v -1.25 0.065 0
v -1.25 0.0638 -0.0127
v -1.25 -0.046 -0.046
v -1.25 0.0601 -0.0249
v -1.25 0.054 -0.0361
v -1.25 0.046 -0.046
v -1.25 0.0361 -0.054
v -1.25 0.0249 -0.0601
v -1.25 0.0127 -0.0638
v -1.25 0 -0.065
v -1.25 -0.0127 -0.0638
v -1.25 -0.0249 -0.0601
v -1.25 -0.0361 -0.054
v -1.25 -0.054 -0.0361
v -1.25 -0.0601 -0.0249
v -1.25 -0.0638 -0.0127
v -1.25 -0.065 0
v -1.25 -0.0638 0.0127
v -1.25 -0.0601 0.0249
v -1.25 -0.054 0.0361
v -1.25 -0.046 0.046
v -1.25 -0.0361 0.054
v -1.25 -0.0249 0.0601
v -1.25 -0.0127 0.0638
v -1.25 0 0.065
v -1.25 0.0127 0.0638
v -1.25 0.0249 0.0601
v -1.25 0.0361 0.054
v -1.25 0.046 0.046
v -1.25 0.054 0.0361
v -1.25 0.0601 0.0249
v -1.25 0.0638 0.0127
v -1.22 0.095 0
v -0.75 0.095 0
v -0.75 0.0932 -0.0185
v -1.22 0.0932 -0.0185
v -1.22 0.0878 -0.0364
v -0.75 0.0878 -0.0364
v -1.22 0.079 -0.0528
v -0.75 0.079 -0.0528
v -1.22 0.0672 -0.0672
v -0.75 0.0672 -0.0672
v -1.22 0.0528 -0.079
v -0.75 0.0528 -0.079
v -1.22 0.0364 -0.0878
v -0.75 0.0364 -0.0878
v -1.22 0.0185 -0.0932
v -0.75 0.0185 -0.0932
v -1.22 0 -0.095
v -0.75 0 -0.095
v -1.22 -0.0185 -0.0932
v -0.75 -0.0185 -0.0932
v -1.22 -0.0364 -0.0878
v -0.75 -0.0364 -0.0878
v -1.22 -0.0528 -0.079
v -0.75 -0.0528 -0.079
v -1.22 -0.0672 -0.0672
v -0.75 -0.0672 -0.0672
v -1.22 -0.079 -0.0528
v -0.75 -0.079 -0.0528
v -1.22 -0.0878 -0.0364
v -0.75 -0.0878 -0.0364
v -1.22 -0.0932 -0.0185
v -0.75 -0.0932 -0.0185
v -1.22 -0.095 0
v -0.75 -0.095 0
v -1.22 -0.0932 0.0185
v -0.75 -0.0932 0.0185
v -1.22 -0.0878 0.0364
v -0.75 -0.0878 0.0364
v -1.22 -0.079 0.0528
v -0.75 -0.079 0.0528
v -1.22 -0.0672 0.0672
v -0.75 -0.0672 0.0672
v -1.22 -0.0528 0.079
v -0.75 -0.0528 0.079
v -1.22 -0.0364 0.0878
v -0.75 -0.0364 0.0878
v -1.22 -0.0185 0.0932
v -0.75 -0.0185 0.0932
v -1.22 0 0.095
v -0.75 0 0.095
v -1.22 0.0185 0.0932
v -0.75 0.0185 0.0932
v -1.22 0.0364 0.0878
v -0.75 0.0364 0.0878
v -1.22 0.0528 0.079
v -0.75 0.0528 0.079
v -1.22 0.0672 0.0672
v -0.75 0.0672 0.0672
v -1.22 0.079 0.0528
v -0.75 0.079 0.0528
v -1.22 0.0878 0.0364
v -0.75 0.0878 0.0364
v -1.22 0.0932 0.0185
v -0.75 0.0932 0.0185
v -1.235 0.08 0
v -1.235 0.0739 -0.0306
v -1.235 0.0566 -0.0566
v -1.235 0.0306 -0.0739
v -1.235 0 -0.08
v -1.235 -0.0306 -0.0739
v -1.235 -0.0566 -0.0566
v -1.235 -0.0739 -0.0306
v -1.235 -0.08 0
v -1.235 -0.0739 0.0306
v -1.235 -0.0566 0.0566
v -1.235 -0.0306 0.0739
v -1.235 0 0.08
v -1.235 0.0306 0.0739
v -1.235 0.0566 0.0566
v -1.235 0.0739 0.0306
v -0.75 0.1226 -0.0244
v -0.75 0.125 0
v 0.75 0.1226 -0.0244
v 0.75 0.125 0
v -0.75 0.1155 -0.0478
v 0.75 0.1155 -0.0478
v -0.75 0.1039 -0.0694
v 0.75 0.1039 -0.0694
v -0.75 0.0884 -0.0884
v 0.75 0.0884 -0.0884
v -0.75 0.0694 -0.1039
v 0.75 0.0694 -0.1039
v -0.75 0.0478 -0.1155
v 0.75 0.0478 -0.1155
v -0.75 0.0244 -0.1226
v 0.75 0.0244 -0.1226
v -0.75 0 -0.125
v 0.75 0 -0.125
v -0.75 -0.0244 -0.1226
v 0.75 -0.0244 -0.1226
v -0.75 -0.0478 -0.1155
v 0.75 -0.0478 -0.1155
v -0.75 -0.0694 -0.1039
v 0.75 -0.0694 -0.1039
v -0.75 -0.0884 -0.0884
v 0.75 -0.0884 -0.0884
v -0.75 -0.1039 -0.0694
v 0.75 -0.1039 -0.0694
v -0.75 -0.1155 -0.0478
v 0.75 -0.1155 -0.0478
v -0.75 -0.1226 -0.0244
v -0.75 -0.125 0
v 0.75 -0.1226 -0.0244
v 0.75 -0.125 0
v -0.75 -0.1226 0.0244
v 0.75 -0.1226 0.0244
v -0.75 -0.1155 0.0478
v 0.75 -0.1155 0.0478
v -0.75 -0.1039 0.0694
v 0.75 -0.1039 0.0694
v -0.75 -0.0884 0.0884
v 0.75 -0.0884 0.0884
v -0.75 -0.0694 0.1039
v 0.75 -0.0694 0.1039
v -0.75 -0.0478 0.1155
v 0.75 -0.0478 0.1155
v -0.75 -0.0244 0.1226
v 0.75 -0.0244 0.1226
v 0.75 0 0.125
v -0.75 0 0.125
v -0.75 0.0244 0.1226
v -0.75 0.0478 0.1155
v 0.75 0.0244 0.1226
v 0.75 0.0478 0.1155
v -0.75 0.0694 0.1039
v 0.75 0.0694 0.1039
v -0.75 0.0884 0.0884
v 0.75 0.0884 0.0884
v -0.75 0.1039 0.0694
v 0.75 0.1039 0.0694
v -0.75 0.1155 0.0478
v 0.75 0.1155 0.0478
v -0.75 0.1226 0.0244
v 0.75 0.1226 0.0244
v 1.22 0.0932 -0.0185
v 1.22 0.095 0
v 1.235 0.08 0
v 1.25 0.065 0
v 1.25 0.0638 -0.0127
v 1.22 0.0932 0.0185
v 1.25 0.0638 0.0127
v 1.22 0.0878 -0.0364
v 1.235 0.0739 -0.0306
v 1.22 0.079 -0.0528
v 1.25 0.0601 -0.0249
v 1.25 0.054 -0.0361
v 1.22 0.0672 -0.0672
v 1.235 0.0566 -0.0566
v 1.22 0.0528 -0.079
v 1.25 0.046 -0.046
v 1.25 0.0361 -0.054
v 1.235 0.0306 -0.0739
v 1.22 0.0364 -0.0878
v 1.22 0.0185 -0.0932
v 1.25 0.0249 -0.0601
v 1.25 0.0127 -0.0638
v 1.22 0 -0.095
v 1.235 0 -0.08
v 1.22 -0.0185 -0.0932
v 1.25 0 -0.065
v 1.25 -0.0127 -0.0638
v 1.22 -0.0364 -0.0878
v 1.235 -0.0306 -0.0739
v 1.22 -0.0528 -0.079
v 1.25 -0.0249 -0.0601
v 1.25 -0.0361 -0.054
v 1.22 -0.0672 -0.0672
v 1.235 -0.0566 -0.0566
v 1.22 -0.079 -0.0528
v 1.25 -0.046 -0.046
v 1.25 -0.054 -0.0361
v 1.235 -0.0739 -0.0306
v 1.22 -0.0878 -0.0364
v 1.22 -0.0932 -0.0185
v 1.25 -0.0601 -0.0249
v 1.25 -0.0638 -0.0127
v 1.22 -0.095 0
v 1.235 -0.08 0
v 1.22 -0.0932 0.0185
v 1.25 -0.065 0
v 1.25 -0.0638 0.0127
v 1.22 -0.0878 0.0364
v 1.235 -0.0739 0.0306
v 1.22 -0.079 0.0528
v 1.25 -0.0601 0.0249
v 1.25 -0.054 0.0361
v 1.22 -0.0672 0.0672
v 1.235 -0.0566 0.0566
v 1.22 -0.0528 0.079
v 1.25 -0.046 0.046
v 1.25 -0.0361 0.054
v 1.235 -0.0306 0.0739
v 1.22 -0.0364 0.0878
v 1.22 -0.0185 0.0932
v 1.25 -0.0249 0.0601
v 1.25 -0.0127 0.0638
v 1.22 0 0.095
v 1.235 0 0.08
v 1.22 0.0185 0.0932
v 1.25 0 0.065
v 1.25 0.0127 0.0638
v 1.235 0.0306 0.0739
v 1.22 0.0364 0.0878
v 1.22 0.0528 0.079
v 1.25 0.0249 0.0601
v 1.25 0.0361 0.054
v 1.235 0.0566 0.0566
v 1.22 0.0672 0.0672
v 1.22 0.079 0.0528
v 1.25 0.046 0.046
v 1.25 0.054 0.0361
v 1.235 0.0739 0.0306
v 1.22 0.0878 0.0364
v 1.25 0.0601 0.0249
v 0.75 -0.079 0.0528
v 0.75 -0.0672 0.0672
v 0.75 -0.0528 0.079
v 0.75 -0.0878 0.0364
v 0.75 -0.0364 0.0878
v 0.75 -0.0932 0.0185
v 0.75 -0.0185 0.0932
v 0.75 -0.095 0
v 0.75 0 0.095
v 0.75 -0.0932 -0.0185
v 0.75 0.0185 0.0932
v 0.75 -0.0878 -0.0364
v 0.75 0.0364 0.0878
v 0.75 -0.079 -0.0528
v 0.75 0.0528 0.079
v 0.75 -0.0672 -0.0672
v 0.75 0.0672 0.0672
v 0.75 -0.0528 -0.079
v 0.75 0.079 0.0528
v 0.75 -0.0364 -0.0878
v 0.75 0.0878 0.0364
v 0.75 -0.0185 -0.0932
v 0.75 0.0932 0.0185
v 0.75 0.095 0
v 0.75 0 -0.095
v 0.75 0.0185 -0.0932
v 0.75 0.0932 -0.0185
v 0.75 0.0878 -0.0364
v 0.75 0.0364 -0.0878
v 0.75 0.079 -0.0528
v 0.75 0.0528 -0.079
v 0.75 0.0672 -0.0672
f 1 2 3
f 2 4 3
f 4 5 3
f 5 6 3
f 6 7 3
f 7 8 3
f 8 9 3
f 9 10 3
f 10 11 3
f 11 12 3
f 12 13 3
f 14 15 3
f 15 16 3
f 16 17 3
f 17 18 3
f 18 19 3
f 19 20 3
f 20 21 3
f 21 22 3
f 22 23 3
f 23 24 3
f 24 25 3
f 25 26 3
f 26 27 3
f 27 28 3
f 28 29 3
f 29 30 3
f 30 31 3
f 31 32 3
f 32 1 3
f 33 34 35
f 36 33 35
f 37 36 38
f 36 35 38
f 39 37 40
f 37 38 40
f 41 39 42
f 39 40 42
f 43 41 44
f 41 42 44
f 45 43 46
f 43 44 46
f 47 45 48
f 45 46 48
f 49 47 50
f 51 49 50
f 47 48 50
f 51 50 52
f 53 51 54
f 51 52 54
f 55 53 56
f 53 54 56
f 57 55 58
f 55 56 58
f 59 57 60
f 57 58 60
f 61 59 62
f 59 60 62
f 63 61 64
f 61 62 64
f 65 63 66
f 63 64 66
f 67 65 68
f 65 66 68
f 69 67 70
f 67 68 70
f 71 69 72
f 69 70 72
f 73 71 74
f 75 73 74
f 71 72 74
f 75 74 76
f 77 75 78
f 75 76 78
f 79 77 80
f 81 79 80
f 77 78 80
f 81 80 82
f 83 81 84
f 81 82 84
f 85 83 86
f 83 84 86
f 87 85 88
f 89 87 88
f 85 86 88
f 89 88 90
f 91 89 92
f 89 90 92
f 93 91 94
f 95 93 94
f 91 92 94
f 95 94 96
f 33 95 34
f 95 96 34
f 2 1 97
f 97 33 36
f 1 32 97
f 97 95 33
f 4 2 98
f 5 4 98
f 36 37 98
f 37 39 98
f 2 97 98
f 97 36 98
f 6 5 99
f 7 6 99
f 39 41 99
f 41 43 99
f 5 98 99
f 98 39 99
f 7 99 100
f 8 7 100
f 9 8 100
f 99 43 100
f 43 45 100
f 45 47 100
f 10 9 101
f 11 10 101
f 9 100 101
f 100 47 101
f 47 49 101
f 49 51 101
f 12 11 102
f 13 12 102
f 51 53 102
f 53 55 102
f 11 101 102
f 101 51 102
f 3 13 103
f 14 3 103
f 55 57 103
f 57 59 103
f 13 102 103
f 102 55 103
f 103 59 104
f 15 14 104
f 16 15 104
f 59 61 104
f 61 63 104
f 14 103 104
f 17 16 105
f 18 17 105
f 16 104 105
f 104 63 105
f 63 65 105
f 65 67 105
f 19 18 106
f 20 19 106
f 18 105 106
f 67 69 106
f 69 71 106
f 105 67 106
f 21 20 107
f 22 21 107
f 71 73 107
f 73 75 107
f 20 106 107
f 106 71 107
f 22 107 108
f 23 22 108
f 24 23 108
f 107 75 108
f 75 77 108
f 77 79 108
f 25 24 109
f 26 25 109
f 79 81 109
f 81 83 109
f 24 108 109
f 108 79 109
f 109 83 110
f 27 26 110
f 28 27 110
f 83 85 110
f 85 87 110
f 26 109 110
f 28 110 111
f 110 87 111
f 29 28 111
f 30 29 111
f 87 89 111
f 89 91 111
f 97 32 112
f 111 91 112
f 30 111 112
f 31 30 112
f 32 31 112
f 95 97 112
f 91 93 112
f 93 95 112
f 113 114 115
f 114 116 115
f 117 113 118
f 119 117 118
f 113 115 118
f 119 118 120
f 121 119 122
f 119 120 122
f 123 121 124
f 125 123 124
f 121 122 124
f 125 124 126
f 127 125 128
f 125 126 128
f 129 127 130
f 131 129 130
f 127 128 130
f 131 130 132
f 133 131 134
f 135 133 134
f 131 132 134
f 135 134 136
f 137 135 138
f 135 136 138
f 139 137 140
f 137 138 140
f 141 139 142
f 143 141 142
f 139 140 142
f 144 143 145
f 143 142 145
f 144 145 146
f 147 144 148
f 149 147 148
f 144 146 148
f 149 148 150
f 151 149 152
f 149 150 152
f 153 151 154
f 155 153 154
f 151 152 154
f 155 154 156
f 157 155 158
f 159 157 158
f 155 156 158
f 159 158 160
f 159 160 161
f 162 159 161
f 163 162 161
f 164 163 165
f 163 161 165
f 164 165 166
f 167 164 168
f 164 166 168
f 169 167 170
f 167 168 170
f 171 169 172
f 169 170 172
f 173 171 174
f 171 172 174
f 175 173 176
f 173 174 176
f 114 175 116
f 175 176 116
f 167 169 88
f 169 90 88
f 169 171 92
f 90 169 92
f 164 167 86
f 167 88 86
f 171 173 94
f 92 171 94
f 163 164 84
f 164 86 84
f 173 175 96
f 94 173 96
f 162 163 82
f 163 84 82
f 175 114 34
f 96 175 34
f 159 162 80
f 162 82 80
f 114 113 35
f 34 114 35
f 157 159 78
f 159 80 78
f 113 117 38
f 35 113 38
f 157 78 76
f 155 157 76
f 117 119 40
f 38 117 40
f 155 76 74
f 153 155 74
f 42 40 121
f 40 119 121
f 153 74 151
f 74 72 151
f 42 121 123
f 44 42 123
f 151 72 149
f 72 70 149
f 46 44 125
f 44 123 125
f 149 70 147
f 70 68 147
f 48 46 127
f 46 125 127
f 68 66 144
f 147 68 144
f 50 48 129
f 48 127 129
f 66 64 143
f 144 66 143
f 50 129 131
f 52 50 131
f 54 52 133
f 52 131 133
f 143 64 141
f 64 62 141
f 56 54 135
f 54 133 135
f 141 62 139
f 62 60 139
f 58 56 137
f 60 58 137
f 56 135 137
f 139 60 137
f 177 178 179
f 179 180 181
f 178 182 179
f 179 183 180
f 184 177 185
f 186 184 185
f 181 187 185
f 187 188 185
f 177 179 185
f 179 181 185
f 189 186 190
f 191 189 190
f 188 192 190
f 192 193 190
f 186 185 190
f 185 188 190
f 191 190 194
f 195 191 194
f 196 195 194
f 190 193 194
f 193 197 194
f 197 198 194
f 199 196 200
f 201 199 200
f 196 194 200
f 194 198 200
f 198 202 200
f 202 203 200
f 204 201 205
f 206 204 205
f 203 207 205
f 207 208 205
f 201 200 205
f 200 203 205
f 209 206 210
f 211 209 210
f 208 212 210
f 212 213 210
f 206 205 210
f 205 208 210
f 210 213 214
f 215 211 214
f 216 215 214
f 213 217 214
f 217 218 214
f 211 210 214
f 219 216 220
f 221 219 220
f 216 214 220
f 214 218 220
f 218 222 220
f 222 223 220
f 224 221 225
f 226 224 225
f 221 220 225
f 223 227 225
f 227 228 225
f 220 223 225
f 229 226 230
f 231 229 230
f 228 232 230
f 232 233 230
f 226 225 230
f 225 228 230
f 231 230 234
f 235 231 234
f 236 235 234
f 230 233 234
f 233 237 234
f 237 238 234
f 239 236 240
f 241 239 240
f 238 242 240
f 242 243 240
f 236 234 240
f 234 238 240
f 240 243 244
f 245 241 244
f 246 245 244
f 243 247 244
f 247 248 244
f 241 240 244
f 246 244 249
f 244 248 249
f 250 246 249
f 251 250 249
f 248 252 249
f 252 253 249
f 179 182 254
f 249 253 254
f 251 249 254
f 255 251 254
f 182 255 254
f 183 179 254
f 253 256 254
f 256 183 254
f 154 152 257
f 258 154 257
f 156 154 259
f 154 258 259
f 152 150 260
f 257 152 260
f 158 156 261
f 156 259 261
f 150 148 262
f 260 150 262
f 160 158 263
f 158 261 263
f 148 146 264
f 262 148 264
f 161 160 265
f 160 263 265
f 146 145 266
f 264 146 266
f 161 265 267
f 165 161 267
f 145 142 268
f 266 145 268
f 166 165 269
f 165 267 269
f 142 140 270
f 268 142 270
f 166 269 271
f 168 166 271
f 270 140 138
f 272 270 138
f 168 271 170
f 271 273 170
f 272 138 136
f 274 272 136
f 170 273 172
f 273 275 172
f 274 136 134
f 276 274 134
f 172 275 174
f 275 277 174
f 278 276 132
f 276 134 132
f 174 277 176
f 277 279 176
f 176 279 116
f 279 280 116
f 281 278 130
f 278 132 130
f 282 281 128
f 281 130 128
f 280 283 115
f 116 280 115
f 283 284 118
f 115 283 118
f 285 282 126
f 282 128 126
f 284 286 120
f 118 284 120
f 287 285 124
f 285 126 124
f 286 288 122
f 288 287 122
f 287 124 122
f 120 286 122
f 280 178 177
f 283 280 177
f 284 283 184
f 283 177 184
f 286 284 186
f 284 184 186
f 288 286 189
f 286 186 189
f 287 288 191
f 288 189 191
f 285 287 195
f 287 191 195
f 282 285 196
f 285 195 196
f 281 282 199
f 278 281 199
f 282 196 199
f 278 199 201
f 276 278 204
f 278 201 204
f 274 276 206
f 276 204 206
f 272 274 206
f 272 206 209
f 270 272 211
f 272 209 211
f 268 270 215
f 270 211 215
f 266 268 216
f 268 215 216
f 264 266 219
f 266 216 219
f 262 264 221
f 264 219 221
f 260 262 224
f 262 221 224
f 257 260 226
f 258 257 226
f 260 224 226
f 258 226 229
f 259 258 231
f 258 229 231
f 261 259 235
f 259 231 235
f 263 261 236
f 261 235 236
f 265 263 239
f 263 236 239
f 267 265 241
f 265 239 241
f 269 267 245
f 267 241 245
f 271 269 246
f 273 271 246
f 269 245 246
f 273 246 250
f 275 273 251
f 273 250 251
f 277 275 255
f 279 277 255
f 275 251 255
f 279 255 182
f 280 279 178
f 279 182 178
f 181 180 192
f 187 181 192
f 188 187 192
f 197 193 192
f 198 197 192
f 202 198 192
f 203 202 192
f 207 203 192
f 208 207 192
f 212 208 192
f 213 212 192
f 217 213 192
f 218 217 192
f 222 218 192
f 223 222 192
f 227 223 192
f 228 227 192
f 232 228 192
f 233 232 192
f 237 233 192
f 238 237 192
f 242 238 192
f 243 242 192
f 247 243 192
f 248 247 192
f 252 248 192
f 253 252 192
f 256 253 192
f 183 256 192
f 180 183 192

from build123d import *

# Parameters (mm, degrees)
CHAMFER1_SIZE = 0.03
CHAMFER2_SIZE = 0.03


with BuildPart() as part:
    # Sketch1 → Revolve1 (revolve)
    with BuildSketch(Plane.XY):
        Polygon((-0.75, 0.125), (0.75, 0.125), (0.75, 0.095), (1.25, 0.095), (1.25, 0), (-1.25, 0), (-1.25, 0.095), (-0.75, 0.095), align=None)
    revolve(axis=Axis((1.25, 0, 0), (-1, 0, 0)))

    # Chamfer1
    chamfer1_edges = [part.edges().sort_by_distance(p)[0] for p in [
        (-1.25, -0.095, 0),
    ]]
    chamfer(chamfer1_edges, length=CHAMFER1_SIZE)

    # Chamfer2
    chamfer2_edges = [part.edges().sort_by_distance(p)[0] for p in [
        (1.25, -0.095, 0),
    ]]
    chamfer(chamfer2_edges, length=CHAMFER2_SIZE)


solid = part.part
